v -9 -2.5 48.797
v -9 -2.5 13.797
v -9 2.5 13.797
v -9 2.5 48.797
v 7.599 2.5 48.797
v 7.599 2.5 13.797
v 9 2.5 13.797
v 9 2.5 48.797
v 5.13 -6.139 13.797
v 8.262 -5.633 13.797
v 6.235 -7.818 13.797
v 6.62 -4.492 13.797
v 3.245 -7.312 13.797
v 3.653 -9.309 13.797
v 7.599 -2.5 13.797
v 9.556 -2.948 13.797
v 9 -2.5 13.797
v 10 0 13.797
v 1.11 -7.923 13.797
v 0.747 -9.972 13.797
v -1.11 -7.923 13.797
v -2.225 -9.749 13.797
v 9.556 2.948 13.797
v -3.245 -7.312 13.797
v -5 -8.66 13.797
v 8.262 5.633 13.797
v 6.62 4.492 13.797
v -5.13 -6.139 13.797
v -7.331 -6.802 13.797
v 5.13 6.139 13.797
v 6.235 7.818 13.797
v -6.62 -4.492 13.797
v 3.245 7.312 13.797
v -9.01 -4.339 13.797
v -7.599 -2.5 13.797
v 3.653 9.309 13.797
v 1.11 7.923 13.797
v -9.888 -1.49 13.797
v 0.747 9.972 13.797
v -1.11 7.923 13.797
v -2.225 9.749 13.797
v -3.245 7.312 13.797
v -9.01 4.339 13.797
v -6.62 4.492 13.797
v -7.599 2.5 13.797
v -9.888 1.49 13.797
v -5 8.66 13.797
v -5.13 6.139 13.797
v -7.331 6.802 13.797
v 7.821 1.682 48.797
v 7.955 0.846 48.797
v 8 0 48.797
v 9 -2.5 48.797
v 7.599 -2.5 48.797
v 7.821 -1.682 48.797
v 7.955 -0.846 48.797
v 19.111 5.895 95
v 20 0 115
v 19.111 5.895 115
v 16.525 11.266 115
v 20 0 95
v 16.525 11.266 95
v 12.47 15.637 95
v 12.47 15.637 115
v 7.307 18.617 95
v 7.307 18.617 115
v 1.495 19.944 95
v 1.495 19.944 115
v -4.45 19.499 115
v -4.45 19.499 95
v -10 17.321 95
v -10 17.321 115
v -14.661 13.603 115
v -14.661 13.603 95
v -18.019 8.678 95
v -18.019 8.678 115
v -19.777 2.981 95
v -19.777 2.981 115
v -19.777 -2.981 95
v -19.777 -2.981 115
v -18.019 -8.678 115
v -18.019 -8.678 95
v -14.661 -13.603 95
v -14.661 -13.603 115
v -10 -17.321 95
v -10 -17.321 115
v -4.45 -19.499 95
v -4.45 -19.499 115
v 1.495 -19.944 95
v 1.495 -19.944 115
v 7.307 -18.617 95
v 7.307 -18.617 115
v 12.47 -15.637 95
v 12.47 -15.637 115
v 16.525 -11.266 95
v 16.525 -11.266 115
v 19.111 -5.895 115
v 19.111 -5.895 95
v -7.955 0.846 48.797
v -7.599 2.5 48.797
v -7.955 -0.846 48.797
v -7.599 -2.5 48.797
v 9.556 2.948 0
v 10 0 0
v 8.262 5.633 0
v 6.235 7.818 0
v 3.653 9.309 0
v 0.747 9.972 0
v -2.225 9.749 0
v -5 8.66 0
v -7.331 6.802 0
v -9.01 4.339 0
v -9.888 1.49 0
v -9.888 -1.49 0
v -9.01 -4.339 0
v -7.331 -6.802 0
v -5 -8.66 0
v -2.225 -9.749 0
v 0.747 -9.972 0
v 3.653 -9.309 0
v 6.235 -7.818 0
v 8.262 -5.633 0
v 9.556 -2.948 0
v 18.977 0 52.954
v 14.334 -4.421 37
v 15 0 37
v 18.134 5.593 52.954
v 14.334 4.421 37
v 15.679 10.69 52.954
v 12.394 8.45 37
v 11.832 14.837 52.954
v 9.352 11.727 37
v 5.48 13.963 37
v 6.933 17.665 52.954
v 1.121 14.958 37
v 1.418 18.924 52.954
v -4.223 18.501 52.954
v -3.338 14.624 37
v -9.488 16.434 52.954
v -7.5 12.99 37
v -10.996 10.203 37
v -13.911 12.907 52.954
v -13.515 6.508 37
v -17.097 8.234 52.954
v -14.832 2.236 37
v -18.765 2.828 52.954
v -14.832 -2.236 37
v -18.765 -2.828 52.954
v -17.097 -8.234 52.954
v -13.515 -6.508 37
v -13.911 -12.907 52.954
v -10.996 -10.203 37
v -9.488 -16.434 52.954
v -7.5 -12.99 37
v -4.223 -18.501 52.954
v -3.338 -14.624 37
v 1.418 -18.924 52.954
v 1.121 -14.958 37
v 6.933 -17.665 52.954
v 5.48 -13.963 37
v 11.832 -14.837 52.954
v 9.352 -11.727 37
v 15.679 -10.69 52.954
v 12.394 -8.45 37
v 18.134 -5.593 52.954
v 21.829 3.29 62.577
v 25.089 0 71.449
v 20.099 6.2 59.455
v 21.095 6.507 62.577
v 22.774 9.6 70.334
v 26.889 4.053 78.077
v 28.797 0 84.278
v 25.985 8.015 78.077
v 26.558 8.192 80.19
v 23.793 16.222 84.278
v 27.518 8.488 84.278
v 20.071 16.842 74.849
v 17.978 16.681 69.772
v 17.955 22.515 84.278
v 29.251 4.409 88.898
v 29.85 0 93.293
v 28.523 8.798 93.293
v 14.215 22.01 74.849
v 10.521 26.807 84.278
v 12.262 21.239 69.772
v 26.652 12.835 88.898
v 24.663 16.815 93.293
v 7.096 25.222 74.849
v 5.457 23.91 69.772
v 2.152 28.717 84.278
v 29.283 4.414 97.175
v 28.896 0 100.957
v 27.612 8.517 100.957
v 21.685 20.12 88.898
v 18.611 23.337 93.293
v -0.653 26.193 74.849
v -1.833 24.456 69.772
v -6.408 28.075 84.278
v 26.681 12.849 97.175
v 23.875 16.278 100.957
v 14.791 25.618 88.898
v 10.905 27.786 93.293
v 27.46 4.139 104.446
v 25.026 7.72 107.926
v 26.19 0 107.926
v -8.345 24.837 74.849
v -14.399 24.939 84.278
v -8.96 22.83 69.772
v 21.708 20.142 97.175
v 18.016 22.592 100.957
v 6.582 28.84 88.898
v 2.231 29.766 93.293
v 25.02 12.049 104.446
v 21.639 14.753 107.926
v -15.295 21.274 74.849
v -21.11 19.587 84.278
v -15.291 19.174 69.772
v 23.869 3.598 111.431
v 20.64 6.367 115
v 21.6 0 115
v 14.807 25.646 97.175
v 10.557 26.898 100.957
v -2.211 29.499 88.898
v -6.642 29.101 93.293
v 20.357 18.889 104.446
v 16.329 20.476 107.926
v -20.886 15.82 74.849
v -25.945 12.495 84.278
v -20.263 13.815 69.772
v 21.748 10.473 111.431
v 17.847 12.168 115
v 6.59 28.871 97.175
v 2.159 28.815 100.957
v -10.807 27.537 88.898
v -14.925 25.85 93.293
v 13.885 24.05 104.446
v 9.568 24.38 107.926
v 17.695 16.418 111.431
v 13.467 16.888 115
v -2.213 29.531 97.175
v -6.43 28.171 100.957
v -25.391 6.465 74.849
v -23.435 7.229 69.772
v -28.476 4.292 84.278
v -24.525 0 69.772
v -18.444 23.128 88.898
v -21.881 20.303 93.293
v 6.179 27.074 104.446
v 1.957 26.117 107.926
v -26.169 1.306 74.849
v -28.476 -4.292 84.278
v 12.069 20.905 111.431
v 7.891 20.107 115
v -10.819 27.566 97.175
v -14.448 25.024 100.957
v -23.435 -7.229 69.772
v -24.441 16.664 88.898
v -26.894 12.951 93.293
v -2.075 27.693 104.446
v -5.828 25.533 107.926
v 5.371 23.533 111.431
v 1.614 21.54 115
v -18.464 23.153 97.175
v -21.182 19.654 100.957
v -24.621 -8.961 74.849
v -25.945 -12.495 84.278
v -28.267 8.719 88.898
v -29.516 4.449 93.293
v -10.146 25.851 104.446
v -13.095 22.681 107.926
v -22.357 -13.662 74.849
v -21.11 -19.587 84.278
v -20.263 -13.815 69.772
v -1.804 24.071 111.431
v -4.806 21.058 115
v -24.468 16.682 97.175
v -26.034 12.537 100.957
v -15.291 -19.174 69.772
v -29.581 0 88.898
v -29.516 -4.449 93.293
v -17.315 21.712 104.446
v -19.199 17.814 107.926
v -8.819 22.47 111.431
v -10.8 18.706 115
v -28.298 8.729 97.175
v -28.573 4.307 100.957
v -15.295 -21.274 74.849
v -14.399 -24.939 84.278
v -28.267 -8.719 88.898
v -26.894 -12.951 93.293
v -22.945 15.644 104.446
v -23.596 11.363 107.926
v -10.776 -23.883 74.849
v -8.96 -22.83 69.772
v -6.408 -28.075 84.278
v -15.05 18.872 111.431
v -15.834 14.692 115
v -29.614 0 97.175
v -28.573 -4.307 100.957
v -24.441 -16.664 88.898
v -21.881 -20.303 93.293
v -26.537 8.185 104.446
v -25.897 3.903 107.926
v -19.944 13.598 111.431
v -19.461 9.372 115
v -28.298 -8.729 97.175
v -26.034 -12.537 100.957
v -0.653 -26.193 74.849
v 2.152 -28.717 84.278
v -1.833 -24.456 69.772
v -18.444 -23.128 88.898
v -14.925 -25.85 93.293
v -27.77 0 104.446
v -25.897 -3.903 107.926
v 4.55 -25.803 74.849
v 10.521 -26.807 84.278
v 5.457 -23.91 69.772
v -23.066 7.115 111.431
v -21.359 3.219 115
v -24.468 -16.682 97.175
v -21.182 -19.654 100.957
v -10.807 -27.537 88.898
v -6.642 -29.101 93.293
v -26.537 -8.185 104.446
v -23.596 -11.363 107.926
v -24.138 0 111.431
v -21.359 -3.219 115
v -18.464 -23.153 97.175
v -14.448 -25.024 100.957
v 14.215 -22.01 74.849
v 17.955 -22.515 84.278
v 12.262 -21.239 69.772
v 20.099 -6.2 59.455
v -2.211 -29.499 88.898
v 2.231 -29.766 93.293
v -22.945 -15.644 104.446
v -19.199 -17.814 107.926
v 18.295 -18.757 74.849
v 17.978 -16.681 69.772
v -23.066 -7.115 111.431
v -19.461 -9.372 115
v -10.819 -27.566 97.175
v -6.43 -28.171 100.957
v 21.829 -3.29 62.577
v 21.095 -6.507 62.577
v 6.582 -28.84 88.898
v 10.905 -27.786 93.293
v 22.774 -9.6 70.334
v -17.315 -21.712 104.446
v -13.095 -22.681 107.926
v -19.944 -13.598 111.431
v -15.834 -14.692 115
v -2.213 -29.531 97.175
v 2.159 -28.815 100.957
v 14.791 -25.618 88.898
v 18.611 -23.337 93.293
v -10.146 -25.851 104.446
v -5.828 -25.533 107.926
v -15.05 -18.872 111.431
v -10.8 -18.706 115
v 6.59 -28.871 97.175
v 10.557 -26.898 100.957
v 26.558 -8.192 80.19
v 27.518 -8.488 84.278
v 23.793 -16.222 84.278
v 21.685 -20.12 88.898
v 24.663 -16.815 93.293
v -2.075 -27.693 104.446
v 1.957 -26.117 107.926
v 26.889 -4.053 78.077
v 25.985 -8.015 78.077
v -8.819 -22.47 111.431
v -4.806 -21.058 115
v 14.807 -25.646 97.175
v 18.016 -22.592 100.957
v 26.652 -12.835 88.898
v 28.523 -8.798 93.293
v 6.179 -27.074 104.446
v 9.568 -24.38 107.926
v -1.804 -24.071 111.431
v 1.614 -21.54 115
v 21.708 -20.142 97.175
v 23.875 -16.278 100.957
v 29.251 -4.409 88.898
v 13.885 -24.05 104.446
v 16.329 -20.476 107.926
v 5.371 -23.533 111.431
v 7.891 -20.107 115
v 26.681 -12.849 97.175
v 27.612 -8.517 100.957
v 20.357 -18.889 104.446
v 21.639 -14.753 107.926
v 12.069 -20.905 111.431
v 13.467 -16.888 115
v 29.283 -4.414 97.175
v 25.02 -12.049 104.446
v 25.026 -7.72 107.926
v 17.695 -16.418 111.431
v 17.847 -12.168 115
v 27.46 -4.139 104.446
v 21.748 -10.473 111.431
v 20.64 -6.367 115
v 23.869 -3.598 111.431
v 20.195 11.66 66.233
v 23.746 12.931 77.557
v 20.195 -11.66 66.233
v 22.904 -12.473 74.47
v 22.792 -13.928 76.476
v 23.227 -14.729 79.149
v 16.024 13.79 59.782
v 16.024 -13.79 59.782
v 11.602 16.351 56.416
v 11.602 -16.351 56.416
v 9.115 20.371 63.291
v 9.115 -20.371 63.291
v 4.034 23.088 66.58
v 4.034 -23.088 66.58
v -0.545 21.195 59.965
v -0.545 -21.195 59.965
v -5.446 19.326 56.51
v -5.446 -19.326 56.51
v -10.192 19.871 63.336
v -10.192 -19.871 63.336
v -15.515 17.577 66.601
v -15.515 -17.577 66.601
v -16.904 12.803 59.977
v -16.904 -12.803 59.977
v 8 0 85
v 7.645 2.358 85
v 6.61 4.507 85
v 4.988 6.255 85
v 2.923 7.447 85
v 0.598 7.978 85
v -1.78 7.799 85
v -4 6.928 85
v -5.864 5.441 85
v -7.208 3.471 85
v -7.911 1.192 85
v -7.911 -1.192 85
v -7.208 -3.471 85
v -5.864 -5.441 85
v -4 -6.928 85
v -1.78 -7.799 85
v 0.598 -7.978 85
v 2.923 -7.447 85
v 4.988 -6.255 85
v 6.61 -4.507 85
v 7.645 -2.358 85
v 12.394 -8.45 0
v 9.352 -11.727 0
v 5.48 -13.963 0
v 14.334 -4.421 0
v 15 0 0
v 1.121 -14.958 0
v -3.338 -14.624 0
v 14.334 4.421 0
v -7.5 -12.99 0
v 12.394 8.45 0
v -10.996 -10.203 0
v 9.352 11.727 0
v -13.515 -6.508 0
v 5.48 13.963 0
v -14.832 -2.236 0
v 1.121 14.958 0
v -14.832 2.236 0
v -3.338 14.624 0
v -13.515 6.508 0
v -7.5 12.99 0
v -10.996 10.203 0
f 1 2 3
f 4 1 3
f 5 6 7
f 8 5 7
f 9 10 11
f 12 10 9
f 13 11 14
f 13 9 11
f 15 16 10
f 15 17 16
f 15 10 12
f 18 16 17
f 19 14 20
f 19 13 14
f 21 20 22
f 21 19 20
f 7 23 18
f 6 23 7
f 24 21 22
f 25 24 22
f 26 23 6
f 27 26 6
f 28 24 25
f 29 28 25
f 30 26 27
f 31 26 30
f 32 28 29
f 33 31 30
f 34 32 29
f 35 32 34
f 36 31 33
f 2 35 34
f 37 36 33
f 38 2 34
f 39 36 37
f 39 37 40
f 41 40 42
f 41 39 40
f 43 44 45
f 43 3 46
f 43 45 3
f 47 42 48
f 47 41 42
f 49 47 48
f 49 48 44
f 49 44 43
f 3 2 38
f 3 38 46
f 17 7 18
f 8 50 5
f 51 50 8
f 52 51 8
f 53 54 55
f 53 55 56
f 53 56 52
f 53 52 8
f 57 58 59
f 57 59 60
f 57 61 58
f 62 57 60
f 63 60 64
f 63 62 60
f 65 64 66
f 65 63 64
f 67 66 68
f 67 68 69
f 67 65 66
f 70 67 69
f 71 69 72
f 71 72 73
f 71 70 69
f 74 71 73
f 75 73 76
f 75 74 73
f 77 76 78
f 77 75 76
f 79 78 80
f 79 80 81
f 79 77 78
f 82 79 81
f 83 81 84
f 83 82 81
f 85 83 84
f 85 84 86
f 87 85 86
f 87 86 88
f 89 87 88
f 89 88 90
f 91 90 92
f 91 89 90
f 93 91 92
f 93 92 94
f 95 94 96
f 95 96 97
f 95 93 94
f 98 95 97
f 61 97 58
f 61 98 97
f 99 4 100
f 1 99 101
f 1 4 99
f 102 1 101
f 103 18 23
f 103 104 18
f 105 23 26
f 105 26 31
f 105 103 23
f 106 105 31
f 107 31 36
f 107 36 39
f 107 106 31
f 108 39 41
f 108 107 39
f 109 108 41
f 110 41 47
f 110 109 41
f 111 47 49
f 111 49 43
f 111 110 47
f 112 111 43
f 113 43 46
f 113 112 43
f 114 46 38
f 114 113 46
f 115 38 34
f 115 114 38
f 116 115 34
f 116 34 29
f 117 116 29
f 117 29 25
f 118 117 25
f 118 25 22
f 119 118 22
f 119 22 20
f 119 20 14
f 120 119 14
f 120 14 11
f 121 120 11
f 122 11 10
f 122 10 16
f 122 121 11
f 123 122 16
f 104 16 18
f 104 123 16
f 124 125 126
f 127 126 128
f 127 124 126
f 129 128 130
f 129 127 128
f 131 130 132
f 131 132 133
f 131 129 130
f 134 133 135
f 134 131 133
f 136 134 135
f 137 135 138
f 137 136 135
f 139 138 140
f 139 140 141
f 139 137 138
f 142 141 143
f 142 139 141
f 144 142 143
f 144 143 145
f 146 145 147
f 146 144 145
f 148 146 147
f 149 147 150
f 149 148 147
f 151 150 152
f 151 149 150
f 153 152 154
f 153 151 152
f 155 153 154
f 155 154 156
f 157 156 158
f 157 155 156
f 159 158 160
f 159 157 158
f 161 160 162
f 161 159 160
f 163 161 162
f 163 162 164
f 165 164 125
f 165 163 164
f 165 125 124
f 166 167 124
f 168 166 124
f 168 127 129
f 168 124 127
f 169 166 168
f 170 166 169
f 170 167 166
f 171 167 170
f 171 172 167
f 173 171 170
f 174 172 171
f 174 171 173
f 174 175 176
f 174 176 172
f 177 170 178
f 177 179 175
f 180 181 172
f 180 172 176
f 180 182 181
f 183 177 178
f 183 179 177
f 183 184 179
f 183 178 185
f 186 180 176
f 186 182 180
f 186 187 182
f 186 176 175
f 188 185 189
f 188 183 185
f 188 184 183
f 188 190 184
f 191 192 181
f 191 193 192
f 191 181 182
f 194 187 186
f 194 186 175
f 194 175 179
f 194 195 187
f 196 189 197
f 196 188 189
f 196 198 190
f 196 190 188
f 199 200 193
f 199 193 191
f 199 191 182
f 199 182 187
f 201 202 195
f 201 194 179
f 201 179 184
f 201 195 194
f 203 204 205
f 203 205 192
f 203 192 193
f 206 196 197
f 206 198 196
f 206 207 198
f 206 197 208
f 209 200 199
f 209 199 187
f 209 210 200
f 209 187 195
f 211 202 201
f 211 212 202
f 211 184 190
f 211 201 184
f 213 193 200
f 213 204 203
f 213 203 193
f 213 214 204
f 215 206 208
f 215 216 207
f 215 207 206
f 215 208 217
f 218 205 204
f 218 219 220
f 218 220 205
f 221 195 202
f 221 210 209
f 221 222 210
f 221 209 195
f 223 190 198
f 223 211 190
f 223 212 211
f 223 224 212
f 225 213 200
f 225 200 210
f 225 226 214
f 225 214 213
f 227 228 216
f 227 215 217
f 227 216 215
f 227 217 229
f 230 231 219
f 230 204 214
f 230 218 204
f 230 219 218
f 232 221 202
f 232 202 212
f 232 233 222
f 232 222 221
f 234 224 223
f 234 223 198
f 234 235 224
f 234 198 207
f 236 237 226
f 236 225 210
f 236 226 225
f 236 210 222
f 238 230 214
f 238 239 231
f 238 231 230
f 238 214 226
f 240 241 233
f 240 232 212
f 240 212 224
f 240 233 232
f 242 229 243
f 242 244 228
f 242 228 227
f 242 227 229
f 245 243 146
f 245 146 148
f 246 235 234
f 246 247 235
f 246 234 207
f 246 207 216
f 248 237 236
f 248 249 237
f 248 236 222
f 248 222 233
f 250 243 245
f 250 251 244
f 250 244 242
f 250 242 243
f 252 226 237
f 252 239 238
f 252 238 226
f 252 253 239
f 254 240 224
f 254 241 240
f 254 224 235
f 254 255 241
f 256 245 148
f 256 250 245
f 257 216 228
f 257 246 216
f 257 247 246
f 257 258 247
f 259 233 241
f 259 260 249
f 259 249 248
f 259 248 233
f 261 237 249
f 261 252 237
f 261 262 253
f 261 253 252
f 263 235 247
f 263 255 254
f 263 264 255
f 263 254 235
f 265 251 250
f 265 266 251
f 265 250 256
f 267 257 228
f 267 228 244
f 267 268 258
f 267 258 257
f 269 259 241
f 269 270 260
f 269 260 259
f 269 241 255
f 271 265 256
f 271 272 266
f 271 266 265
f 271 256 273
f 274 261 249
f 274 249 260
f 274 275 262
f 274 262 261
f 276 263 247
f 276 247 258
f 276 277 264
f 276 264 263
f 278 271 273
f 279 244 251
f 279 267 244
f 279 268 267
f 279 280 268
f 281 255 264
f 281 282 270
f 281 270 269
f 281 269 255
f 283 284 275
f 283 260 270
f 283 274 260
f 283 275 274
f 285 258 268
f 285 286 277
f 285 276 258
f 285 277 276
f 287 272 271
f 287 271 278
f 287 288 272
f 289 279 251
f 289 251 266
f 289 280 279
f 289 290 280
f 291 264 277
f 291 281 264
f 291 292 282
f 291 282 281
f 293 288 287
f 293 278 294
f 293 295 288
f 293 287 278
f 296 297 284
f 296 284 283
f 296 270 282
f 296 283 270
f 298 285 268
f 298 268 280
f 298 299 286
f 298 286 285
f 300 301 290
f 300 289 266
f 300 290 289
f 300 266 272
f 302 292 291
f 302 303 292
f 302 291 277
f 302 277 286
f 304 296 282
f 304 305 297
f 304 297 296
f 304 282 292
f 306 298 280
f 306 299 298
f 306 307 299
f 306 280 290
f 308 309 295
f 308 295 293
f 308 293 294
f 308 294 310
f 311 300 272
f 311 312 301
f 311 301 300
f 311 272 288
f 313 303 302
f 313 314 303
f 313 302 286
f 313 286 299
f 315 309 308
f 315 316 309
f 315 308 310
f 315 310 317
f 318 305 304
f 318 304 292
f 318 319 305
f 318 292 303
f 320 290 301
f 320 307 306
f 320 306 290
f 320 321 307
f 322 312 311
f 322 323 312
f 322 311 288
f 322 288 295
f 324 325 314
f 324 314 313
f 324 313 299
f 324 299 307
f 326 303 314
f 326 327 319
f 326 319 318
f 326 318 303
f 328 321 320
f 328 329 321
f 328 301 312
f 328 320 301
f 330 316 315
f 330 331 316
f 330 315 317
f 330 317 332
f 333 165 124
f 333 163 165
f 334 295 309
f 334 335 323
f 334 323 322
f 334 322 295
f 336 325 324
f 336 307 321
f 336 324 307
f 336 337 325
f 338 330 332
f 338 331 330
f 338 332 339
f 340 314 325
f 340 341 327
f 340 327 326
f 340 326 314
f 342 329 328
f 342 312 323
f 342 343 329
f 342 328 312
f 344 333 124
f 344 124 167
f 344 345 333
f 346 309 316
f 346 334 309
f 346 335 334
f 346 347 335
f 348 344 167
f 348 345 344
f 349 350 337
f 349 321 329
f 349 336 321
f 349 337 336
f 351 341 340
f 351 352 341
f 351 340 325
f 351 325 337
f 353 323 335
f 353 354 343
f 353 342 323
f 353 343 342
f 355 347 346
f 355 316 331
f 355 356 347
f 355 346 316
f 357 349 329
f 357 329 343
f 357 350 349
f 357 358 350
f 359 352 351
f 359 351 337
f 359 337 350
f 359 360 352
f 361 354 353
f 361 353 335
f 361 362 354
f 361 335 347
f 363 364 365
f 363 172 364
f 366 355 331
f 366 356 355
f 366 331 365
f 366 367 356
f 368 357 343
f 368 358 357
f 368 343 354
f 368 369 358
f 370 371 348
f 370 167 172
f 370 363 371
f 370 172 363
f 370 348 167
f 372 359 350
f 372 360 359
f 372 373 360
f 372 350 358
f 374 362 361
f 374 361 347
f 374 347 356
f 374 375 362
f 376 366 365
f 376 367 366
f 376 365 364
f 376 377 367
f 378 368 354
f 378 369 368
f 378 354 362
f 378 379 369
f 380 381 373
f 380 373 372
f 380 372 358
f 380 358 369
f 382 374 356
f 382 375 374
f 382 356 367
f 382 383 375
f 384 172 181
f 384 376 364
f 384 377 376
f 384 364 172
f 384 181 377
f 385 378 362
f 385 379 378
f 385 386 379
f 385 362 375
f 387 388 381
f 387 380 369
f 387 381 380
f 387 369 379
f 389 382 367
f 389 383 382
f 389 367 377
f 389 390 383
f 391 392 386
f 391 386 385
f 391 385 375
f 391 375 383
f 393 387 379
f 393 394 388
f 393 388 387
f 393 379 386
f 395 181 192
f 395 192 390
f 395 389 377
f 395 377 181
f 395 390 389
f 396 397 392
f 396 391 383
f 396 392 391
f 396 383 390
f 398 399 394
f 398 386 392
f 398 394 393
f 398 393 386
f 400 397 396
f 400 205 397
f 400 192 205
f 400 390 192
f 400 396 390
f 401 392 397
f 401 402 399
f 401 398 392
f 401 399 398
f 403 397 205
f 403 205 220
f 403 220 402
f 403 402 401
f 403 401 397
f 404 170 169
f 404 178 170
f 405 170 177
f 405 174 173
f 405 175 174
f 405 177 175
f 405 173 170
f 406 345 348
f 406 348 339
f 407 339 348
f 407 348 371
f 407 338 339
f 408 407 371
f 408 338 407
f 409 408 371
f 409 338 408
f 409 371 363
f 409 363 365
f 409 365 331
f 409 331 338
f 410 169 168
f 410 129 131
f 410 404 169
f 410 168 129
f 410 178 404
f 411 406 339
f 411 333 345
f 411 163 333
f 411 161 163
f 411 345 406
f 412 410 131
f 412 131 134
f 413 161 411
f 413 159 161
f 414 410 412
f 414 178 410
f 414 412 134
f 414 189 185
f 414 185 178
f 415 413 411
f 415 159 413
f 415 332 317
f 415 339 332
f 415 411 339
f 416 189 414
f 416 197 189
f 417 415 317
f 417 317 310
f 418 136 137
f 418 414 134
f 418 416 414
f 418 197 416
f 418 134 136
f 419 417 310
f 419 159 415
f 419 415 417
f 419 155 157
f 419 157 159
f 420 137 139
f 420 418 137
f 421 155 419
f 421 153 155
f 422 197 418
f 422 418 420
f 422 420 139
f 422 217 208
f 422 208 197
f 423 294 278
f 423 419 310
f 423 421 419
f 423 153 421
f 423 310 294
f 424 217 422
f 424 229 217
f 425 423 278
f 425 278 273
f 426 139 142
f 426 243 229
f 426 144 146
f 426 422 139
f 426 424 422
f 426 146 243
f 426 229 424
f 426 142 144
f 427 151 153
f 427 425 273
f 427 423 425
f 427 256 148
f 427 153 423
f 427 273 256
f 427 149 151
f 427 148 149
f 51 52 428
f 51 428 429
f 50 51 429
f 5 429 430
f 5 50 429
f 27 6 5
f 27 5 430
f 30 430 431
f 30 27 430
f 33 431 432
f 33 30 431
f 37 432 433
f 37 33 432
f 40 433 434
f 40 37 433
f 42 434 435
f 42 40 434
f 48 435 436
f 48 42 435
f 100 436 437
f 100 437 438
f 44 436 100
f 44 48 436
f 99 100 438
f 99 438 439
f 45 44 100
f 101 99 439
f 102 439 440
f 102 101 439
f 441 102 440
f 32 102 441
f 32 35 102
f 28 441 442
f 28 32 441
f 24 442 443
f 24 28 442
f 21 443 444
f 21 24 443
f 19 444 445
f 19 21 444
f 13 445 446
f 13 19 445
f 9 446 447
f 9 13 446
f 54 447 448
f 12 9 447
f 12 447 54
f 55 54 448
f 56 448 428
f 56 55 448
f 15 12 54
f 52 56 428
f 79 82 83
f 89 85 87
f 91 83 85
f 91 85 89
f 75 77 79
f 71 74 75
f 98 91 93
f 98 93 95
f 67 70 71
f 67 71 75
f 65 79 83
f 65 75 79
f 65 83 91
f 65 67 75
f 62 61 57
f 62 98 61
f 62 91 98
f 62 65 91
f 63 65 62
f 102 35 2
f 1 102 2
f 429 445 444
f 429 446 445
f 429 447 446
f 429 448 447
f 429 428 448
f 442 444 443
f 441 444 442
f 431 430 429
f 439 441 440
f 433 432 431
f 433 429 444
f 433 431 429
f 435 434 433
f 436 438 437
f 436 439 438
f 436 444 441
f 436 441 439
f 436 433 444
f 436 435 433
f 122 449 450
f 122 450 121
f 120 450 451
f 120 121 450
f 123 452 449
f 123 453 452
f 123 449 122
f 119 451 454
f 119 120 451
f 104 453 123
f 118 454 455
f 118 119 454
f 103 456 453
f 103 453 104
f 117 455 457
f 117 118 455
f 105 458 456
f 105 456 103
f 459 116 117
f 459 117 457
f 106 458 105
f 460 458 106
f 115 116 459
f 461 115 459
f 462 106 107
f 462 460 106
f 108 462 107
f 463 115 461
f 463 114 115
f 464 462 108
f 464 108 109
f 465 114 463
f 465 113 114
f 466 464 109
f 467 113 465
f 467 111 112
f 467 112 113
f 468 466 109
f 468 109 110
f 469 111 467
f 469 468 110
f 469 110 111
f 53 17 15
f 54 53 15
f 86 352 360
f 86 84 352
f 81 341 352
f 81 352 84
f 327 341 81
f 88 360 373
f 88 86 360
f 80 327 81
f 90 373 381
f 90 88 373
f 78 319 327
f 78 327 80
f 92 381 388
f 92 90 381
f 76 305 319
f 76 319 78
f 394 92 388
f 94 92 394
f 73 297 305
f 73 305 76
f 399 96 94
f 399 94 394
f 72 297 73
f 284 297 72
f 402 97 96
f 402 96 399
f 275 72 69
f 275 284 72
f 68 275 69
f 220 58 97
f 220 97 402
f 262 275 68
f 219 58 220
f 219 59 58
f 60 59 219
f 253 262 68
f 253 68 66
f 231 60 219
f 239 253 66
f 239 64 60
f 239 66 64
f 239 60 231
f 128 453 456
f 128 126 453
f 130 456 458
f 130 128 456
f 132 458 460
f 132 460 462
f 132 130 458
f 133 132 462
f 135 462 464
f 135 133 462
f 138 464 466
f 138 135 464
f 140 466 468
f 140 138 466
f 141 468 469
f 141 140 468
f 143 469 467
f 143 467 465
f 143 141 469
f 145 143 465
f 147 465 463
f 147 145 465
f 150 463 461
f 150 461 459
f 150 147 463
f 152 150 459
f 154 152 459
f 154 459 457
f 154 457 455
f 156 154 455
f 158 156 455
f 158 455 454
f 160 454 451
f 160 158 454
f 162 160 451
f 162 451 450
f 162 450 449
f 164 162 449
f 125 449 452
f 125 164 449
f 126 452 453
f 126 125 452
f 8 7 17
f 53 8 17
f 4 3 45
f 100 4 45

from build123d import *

# Parameters (mm, degrees)
F3_DEPTH = 35


with BuildPart() as f1:
    # F0 (on Front) → F1 (revolve)
    with BuildSketch(Plane.XZ):
        with BuildLine():
            Line((10, 0), (15, 0))
            Line((15, 0), (15, 37))
            add(Edge.make_bspline(
                [(15, 37), (19.0353800747, 58.2166660939), (33.9262575449, 86.7684902948), (28.5537857562, 105.9863269329), (21.6, 115)],
                knots=[0, 0, 0, 0, 0.5797552931, 1, 1, 1, 1], degree=3))
            Line((21.6, 115), (20, 115))
            Line((20, 115), (20, 95))
            Line((20, 95), (0, 95))
            Line((0, 95), (0, 85))
            Line((0, 85), (8, 85))
            Line((8, 85), (8, 13.7968156487))
            Line((8, 13.7968156487), (10, 13.7968156487))
            Line((10, 13.7968156487), (10, 0))
        make_face()
    revolve(axis=Axis((0, 0, 90), (0, 0, 1)))

    # F2 (on face) → F3 (cut)
    with BuildSketch(Plane(origin=(0, 0, 13.7968156487), x_dir=(1, 0, 0), z_dir=(0, 0, -1))):
        with BuildLine():
            Line((-7.5993420768, 2.5), (-9, 2.5))
            Line((-9, 2.5), (-9, -2.5))
            Line((-9, -2.5), (-7.5993420768, -2.5))
            ThreePointArc((-7.5993420768, -2.5), (-8, 0), (-7.5993420768, 2.5))
        make_face()
        with BuildLine():
            Line((9, 2.5), (7.5993420768, 2.5))
            ThreePointArc((7.5993420768, 2.5), (7.8992004853, 1.2659509046), (8, 0))
            ThreePointArc((8, 0), (7.8992004853, -1.2659509046), (7.5993420768, -2.5))
            Line((7.5993420768, -2.5), (9, -2.5))
            Line((9, -2.5), (9, 2.5))
        make_face()
    extrude(amount=-F3_DEPTH, mode=Mode.SUBTRACT)


solid = f1.part
